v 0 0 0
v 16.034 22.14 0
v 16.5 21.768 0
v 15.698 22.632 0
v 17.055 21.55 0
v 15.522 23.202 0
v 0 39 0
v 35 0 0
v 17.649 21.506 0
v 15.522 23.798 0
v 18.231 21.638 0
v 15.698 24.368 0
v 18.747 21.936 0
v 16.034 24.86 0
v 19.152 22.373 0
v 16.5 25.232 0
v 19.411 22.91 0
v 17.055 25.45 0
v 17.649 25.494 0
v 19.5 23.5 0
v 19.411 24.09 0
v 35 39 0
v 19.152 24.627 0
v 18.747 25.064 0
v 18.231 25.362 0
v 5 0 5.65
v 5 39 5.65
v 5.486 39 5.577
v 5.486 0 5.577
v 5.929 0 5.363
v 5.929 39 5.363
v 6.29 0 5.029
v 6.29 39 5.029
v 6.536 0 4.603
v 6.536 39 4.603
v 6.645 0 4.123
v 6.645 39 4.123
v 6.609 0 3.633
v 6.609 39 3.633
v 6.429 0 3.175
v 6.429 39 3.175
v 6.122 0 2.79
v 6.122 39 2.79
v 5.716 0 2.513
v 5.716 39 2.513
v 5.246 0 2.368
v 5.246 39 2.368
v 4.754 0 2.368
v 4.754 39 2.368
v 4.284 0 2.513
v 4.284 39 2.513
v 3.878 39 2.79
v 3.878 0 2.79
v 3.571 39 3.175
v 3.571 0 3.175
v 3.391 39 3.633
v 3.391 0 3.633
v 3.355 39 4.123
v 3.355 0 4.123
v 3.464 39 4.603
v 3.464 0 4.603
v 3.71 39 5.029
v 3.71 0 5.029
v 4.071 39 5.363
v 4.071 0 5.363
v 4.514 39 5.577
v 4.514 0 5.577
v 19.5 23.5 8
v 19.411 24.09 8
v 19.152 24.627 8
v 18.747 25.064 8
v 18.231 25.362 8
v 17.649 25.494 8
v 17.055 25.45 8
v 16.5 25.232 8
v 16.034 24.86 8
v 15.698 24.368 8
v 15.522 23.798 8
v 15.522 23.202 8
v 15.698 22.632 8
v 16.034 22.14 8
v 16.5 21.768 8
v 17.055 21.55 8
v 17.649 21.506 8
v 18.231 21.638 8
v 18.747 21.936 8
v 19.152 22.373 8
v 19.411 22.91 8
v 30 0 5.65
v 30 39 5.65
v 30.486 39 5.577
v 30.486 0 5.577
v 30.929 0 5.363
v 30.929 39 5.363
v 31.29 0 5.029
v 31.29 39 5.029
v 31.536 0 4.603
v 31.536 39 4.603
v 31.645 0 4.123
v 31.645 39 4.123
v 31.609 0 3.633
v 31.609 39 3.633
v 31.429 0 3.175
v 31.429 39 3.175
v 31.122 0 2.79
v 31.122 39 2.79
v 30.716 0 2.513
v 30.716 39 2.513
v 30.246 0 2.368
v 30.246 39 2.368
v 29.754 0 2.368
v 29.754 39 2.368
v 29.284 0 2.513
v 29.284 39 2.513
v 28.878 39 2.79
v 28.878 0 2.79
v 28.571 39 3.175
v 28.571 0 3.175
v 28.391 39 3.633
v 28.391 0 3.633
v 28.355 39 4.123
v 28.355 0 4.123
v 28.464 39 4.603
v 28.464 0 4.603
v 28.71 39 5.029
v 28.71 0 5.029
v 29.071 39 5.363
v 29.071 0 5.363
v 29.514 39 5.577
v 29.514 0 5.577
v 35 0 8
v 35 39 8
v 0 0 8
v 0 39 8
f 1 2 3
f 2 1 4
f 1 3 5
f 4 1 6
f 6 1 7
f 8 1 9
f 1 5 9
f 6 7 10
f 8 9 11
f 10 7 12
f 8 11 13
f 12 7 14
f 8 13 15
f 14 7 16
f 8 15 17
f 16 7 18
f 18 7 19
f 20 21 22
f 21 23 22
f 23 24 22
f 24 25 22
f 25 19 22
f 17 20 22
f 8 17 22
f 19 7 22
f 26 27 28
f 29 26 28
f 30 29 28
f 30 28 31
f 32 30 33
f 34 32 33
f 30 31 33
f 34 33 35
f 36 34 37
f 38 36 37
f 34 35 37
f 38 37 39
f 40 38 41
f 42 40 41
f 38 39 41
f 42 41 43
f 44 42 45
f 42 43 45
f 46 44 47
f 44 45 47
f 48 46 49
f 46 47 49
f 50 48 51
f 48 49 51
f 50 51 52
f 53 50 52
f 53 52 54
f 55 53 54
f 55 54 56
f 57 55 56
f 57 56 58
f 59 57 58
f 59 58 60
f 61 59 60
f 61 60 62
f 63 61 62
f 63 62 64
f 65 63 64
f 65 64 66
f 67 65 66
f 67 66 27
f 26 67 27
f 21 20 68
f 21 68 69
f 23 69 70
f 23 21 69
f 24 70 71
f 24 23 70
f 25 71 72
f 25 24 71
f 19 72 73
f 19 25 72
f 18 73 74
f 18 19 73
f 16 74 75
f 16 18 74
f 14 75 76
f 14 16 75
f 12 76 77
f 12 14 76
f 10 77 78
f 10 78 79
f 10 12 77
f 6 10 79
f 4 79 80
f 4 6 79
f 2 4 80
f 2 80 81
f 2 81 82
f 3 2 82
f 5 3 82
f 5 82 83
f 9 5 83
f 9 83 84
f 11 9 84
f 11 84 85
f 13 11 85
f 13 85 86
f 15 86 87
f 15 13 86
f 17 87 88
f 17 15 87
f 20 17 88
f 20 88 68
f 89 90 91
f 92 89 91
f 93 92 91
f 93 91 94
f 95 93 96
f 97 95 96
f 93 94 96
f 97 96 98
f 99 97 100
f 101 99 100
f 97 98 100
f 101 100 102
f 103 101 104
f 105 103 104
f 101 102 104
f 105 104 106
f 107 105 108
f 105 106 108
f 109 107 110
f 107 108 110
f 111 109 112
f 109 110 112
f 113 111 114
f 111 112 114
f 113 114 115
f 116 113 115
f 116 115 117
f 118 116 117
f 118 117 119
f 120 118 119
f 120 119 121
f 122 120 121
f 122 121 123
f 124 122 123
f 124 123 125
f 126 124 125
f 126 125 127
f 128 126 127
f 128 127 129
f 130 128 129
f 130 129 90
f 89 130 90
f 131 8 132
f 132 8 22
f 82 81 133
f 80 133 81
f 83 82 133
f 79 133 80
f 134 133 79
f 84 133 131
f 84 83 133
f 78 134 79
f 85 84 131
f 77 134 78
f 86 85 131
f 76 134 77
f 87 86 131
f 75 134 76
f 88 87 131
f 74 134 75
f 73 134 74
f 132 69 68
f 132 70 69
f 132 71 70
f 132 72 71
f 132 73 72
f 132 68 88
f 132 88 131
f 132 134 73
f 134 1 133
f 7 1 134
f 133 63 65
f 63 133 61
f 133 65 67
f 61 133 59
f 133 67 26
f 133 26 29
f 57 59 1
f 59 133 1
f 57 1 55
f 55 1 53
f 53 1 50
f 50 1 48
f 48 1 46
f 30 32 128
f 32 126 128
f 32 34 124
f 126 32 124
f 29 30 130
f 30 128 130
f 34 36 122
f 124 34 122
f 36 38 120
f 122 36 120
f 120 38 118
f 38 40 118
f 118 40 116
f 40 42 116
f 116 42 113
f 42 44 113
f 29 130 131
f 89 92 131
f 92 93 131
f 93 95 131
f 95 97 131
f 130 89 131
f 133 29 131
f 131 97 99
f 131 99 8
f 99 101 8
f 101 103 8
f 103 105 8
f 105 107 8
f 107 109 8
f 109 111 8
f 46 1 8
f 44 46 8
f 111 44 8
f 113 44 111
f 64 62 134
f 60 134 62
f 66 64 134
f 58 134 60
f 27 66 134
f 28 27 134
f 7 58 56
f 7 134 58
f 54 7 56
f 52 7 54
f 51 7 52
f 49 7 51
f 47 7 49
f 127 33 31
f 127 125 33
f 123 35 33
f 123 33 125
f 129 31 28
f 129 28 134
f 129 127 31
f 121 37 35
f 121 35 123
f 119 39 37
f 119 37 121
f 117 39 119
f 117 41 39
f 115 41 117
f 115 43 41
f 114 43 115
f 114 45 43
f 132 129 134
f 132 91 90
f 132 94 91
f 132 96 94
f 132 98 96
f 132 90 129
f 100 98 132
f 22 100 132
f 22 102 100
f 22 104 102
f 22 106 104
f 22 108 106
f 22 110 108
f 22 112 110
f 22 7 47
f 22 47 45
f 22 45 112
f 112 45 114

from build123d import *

# Parameters (mm, degrees)
SKETCH_1_W          = 35
SKETCH_1_H          = 39
SKETCH_1_R          = 2
EXTRUDE_1_DEPTH     = 8
SKETCH_2_R          = 1.65
CUT_EXTRUDE_1_DEPTH = 54.009433123


with BuildPart() as part:
    # 草图1 → 凸台-拉伸1 (new body)
    with BuildSketch(Plane.XY):
        with Locations((17.5, 19.5)):
            Rectangle(SKETCH_1_W, SKETCH_1_H)
        with Locations((17.5, 23.5)):
            Circle(SKETCH_1_R, mode=Mode.SUBTRACT)
    extrude(amount=EXTRUDE_1_DEPTH)

    # 草图2 → 切除-拉伸1 (cut, through all)
    with BuildSketch(Plane(origin=(0, 39, 0), x_dir=(1, 0, 0), z_dir=(0, 1, 0))):
        with Locations(Location((5, -4, 0), (0, 0, 270))):
            Circle(SKETCH_2_R)
        with Locations(Location((30, -4, 0), (0, 0, 270))):
            Circle(SKETCH_2_R)
    extrude(amount=-CUT_EXTRUDE_1_DEPTH, mode=Mode.SUBTRACT)


solid = part.part
